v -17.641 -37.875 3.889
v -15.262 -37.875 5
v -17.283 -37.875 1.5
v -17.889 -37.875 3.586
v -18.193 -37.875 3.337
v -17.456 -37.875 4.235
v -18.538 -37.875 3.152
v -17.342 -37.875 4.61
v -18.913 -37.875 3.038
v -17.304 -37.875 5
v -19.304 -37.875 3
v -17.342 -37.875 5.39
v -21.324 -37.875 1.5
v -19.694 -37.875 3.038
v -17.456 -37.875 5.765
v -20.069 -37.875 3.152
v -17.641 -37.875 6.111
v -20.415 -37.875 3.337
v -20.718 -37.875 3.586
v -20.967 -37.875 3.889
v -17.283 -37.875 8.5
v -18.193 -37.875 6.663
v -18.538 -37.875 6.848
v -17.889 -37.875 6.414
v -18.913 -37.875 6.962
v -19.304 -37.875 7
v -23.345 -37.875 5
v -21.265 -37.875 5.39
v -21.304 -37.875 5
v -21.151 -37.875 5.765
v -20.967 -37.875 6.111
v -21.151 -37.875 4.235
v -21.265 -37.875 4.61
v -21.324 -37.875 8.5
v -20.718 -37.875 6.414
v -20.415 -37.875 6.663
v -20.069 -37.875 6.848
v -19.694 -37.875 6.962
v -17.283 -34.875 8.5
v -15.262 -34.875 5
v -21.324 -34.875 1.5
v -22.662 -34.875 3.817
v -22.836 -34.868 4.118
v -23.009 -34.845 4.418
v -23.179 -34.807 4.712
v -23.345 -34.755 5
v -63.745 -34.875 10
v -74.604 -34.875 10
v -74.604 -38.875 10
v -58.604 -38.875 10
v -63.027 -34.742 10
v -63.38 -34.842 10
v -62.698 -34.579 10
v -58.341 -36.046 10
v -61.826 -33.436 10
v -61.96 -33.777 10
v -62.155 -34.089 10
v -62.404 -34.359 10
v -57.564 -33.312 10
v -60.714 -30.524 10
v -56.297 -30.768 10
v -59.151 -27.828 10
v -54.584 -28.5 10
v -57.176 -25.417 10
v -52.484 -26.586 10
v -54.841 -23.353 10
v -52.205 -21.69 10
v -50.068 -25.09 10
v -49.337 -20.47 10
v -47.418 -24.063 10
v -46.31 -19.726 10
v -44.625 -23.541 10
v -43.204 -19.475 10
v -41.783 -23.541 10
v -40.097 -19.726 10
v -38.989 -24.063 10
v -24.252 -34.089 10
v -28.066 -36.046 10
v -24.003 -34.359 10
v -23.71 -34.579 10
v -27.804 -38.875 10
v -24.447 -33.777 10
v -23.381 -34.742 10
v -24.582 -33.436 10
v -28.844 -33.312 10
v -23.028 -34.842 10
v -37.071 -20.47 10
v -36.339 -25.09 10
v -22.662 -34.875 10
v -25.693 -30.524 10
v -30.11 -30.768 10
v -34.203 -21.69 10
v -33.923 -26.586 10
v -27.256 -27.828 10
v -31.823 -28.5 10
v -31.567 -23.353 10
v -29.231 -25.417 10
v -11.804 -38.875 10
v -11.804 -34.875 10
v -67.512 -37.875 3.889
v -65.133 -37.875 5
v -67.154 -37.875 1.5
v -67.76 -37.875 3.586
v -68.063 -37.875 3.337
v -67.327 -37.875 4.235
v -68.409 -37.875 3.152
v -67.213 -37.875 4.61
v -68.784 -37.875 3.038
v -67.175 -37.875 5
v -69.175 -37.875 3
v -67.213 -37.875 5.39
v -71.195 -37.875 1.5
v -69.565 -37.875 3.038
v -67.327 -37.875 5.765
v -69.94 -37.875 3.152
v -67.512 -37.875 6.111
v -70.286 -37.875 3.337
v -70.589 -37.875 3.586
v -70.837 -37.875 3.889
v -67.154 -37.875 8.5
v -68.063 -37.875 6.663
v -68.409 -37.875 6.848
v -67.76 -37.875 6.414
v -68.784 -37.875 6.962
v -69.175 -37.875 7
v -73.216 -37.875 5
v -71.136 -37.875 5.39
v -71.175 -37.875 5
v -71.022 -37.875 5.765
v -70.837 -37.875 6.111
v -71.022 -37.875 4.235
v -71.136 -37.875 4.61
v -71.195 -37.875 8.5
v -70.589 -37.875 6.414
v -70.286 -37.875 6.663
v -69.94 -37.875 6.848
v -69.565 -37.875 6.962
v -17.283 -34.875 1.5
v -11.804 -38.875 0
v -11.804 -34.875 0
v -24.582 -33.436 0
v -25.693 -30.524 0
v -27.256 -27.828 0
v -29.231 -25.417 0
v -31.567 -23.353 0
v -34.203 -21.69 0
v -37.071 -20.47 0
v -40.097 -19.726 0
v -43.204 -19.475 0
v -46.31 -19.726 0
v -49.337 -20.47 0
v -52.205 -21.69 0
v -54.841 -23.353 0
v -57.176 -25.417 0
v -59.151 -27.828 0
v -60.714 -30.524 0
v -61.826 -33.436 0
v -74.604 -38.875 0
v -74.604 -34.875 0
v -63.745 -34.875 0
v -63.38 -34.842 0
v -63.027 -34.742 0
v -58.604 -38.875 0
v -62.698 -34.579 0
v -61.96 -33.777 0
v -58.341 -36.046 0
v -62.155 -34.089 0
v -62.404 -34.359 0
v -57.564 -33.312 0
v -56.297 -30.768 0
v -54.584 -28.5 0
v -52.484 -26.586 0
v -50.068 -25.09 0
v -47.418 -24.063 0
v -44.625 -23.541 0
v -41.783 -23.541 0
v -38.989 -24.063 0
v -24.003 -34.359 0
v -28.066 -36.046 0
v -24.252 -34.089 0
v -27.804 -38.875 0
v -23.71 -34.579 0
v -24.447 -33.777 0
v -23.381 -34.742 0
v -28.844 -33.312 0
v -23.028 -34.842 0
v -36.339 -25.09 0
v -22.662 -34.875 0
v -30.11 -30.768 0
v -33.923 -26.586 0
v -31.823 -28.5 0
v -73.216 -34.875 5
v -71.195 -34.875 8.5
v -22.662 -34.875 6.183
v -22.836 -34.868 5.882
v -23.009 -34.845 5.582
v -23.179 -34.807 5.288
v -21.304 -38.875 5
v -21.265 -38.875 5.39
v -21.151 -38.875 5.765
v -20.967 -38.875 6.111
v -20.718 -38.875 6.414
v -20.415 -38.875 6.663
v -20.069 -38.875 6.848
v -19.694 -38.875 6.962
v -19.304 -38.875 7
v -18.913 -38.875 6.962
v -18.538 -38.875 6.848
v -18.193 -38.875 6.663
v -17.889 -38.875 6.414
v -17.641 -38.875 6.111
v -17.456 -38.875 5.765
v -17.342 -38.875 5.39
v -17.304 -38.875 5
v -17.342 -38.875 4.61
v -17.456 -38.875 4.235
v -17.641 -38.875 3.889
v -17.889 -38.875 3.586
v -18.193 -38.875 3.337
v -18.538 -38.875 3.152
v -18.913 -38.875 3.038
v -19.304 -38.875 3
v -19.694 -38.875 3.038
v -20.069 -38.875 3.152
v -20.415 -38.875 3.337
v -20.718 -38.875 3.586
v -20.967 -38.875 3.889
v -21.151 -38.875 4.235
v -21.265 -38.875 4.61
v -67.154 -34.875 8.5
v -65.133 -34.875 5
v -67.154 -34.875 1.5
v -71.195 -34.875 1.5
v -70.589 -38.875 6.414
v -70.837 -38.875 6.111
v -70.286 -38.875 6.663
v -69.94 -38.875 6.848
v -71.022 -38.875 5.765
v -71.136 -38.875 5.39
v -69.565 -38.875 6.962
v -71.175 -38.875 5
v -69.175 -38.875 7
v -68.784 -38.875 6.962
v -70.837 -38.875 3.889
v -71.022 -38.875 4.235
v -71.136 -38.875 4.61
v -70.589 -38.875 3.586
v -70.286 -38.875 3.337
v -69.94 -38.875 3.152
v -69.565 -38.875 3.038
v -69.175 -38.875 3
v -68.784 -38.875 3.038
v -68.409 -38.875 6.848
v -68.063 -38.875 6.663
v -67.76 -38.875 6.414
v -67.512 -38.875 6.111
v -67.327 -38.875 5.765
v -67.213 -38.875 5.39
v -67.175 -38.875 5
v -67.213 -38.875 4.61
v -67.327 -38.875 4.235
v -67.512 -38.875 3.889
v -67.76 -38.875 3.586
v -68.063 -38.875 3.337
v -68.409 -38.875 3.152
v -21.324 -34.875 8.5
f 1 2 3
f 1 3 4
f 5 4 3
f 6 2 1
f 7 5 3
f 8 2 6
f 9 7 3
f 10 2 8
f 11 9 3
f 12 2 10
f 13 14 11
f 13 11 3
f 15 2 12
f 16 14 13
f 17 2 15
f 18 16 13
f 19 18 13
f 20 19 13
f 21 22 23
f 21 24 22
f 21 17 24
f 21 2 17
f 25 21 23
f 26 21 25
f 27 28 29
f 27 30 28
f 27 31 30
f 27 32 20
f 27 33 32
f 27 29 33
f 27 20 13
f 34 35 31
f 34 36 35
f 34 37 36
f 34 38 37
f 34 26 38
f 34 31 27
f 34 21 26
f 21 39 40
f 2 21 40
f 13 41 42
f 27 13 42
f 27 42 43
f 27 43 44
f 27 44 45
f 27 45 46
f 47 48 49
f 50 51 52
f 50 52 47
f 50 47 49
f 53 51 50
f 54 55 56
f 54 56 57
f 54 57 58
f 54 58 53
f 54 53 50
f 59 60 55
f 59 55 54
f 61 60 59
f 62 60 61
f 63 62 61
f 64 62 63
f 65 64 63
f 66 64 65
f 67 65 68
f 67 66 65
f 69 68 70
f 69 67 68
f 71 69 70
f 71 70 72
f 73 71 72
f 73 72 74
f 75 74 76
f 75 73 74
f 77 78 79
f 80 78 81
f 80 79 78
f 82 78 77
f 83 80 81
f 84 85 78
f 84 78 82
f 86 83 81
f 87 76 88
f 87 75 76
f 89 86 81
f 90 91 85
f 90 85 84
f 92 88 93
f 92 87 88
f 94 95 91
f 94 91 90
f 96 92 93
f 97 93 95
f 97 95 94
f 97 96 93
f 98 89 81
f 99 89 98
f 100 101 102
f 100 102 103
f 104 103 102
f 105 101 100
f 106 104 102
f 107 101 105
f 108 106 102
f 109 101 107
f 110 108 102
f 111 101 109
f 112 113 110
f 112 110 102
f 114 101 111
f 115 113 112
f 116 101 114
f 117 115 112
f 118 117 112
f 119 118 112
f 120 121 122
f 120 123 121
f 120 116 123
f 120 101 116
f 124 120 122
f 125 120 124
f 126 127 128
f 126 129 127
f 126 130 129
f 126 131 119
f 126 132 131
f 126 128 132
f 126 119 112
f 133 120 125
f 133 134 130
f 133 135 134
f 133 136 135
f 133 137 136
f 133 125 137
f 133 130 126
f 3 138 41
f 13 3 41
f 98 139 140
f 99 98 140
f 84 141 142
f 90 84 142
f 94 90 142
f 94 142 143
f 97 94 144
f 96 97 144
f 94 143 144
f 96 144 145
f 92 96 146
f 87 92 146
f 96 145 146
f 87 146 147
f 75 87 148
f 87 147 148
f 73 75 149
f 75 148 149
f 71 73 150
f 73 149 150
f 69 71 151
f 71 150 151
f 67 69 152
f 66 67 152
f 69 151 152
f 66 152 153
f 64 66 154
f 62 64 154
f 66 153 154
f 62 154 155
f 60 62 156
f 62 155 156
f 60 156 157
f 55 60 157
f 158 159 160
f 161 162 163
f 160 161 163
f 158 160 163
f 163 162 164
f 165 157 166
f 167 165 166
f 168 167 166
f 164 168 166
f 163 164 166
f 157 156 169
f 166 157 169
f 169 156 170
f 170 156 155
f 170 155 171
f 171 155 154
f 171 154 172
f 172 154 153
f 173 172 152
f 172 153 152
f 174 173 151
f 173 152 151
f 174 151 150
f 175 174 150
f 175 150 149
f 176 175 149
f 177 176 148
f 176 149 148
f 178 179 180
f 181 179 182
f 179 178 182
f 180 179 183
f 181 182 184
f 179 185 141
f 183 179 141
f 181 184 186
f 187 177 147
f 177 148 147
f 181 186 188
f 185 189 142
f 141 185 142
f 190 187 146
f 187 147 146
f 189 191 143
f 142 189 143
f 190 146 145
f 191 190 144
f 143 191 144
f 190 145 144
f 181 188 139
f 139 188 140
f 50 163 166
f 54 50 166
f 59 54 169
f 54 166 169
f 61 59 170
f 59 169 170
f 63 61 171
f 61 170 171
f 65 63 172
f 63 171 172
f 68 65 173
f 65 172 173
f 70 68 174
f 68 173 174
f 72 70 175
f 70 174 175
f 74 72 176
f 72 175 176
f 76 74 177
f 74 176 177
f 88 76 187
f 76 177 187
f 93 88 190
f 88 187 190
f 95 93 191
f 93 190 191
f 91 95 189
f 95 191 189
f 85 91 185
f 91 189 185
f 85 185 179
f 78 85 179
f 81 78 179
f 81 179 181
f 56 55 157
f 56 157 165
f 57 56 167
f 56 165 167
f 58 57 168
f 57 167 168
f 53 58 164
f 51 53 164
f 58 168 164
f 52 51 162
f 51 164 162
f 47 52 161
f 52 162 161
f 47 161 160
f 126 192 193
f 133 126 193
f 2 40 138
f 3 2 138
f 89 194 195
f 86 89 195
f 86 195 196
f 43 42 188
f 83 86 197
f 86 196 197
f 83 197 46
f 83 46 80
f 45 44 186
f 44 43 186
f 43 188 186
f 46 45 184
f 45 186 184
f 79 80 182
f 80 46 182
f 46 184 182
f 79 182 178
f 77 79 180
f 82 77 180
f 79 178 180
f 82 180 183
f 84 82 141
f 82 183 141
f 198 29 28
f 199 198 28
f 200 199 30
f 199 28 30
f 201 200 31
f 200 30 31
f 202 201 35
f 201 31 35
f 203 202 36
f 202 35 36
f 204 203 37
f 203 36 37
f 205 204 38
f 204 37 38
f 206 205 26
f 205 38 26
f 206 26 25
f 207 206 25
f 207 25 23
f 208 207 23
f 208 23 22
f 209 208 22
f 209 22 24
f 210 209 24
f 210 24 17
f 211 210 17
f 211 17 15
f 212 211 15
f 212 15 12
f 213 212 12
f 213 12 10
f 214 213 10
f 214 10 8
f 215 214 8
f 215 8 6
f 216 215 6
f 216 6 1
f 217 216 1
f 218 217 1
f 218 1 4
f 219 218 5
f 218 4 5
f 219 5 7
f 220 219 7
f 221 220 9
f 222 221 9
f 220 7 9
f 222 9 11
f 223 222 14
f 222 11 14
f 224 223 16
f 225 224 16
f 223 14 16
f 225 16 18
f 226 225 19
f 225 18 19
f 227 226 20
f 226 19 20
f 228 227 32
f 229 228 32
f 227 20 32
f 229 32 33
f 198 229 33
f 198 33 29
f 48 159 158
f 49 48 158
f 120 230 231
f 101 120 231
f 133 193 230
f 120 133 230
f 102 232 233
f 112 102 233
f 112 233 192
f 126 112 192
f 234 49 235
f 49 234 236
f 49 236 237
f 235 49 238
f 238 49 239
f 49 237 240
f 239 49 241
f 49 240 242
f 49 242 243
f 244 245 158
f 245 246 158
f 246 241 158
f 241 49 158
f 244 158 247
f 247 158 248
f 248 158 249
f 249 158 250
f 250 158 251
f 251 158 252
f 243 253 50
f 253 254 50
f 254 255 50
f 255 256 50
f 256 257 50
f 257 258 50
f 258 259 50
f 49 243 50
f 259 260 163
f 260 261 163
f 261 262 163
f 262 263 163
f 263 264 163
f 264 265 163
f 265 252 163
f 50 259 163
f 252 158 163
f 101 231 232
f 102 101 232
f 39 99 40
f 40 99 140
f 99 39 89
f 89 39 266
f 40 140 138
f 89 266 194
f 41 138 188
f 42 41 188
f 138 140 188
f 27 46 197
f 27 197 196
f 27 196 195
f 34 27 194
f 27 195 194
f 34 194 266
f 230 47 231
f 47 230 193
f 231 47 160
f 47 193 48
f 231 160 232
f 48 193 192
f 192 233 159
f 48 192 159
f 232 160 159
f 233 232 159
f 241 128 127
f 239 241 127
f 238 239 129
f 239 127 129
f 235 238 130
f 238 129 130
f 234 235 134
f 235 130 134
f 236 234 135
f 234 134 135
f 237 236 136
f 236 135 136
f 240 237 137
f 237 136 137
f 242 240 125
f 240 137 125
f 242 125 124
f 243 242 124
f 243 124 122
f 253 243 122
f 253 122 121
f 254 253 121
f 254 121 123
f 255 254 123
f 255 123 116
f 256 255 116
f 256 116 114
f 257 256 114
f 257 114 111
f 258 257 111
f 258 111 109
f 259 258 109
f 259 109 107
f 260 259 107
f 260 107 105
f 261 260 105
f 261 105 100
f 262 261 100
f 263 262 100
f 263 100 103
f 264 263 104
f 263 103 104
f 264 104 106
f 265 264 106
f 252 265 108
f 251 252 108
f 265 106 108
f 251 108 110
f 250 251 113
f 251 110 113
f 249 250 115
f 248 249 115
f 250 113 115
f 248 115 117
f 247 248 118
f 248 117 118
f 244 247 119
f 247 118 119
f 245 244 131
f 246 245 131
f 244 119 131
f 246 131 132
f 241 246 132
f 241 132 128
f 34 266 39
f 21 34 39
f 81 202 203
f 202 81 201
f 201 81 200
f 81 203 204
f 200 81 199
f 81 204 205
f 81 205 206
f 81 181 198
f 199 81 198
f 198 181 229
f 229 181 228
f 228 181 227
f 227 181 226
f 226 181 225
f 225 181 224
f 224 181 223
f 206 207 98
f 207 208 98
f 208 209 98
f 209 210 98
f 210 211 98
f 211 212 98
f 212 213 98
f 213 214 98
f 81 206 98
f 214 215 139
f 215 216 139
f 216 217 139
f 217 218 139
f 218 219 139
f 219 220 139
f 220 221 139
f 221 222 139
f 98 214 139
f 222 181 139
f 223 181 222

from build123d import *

# Parameters (mm, degrees)
F1_DEPTH = 10
F2_R     = 2
F3_DEPTH = 4.001
F5_DEPTH = 3
F7_DEPTH = 3
F8_DEPTH = 25


with BuildPart() as f1:
    # F0 (on Top) → F1 (new body)
    with BuildSketch(Plane.XY):
        with BuildLine():
            ThreePointArc((-58.60368, -38.875302), (-43.20368, -23.475302), (-27.80368, -38.875302))
            Line((-27.80368, -38.875302), (-11.80368, -38.875302))
            Line((-11.80368, -38.875302), (-11.80368, -34.875302))
            Line((-11.80368, -34.875302), (-22.662015, -34.875302))
            ThreePointArc((-22.662015, -34.875302), (-23.861703, -34.475536), (-24.581796, -33.43605))
            ThreePointArc((-24.581796, -33.43605), (-43.20368, -19.475302), (-61.825563, -33.43605))
            ThreePointArc((-61.825563, -33.43605), (-62.545656, -34.475536), (-63.745345, -34.875302))
            Line((-63.745345, -34.875302), (-74.60368, -34.875302))
            Line((-74.60368, -34.875302), (-74.60368, -38.875302))
            Line((-74.60368, -38.875302), (-62.60368, -38.875302))
            Line((-62.60368, -38.875302), (-58.60368, -38.875302))
        make_face()
    extrude(amount=F1_DEPTH)

    # F2 (on face) → F3 (cut, through all)
    with BuildSketch(Plane(origin=(0, -34.875302, 0), x_dir=(-1, 0, 0), z_dir=(0, 1, 0))):
        with Locations((69.174512, 5)):
            Circle(F2_R)
        with Locations((19.30368, 5)):
            Circle(F2_R)
    extrude(amount=-F3_DEPTH, mode=Mode.SUBTRACT)

    # F4 (on face) → F5 (cut)
    with BuildSketch(Plane(origin=(0, -34.875302, 0), x_dir=(-1, 0, 0), z_dir=(0, 1, 0))):
        Polygon((65.13306, 5), (67.153786, 1.5), (71.195238, 1.5), (73.215964, 5), (71.195238, 8.5), (67.153786, 8.5), align=None)
    extrude(amount=-F5_DEPTH, mode=Mode.SUBTRACT)

    # F6 (on face) → F7 (cut)
    with BuildSketch(Plane(origin=(0, -34.875302, 0), x_dir=(-1, 0, 0), z_dir=(0, 1, 0))):
        Polygon((15.262228, 5), (17.282954, 1.5), (21.324406, 1.5), (23.345132, 5), (21.324406, 8.5), (17.282954, 8.5), align=None)
    extrude(amount=-F7_DEPTH, mode=Mode.SUBTRACT)

    # F6 (on face) → F8 (cut)
    with BuildSketch(Plane(origin=(0, -34.875302, 0), x_dir=(-1, 0, 0), z_dir=(0, 1, 0))):
        Polygon((15.262228, 5), (17.282954, 1.5), (21.324406, 1.5), (23.345132, 5), (21.324406, 8.5), (17.282954, 8.5), align=None)
    extrude(amount=F8_DEPTH, mode=Mode.SUBTRACT)


solid = f1.part
